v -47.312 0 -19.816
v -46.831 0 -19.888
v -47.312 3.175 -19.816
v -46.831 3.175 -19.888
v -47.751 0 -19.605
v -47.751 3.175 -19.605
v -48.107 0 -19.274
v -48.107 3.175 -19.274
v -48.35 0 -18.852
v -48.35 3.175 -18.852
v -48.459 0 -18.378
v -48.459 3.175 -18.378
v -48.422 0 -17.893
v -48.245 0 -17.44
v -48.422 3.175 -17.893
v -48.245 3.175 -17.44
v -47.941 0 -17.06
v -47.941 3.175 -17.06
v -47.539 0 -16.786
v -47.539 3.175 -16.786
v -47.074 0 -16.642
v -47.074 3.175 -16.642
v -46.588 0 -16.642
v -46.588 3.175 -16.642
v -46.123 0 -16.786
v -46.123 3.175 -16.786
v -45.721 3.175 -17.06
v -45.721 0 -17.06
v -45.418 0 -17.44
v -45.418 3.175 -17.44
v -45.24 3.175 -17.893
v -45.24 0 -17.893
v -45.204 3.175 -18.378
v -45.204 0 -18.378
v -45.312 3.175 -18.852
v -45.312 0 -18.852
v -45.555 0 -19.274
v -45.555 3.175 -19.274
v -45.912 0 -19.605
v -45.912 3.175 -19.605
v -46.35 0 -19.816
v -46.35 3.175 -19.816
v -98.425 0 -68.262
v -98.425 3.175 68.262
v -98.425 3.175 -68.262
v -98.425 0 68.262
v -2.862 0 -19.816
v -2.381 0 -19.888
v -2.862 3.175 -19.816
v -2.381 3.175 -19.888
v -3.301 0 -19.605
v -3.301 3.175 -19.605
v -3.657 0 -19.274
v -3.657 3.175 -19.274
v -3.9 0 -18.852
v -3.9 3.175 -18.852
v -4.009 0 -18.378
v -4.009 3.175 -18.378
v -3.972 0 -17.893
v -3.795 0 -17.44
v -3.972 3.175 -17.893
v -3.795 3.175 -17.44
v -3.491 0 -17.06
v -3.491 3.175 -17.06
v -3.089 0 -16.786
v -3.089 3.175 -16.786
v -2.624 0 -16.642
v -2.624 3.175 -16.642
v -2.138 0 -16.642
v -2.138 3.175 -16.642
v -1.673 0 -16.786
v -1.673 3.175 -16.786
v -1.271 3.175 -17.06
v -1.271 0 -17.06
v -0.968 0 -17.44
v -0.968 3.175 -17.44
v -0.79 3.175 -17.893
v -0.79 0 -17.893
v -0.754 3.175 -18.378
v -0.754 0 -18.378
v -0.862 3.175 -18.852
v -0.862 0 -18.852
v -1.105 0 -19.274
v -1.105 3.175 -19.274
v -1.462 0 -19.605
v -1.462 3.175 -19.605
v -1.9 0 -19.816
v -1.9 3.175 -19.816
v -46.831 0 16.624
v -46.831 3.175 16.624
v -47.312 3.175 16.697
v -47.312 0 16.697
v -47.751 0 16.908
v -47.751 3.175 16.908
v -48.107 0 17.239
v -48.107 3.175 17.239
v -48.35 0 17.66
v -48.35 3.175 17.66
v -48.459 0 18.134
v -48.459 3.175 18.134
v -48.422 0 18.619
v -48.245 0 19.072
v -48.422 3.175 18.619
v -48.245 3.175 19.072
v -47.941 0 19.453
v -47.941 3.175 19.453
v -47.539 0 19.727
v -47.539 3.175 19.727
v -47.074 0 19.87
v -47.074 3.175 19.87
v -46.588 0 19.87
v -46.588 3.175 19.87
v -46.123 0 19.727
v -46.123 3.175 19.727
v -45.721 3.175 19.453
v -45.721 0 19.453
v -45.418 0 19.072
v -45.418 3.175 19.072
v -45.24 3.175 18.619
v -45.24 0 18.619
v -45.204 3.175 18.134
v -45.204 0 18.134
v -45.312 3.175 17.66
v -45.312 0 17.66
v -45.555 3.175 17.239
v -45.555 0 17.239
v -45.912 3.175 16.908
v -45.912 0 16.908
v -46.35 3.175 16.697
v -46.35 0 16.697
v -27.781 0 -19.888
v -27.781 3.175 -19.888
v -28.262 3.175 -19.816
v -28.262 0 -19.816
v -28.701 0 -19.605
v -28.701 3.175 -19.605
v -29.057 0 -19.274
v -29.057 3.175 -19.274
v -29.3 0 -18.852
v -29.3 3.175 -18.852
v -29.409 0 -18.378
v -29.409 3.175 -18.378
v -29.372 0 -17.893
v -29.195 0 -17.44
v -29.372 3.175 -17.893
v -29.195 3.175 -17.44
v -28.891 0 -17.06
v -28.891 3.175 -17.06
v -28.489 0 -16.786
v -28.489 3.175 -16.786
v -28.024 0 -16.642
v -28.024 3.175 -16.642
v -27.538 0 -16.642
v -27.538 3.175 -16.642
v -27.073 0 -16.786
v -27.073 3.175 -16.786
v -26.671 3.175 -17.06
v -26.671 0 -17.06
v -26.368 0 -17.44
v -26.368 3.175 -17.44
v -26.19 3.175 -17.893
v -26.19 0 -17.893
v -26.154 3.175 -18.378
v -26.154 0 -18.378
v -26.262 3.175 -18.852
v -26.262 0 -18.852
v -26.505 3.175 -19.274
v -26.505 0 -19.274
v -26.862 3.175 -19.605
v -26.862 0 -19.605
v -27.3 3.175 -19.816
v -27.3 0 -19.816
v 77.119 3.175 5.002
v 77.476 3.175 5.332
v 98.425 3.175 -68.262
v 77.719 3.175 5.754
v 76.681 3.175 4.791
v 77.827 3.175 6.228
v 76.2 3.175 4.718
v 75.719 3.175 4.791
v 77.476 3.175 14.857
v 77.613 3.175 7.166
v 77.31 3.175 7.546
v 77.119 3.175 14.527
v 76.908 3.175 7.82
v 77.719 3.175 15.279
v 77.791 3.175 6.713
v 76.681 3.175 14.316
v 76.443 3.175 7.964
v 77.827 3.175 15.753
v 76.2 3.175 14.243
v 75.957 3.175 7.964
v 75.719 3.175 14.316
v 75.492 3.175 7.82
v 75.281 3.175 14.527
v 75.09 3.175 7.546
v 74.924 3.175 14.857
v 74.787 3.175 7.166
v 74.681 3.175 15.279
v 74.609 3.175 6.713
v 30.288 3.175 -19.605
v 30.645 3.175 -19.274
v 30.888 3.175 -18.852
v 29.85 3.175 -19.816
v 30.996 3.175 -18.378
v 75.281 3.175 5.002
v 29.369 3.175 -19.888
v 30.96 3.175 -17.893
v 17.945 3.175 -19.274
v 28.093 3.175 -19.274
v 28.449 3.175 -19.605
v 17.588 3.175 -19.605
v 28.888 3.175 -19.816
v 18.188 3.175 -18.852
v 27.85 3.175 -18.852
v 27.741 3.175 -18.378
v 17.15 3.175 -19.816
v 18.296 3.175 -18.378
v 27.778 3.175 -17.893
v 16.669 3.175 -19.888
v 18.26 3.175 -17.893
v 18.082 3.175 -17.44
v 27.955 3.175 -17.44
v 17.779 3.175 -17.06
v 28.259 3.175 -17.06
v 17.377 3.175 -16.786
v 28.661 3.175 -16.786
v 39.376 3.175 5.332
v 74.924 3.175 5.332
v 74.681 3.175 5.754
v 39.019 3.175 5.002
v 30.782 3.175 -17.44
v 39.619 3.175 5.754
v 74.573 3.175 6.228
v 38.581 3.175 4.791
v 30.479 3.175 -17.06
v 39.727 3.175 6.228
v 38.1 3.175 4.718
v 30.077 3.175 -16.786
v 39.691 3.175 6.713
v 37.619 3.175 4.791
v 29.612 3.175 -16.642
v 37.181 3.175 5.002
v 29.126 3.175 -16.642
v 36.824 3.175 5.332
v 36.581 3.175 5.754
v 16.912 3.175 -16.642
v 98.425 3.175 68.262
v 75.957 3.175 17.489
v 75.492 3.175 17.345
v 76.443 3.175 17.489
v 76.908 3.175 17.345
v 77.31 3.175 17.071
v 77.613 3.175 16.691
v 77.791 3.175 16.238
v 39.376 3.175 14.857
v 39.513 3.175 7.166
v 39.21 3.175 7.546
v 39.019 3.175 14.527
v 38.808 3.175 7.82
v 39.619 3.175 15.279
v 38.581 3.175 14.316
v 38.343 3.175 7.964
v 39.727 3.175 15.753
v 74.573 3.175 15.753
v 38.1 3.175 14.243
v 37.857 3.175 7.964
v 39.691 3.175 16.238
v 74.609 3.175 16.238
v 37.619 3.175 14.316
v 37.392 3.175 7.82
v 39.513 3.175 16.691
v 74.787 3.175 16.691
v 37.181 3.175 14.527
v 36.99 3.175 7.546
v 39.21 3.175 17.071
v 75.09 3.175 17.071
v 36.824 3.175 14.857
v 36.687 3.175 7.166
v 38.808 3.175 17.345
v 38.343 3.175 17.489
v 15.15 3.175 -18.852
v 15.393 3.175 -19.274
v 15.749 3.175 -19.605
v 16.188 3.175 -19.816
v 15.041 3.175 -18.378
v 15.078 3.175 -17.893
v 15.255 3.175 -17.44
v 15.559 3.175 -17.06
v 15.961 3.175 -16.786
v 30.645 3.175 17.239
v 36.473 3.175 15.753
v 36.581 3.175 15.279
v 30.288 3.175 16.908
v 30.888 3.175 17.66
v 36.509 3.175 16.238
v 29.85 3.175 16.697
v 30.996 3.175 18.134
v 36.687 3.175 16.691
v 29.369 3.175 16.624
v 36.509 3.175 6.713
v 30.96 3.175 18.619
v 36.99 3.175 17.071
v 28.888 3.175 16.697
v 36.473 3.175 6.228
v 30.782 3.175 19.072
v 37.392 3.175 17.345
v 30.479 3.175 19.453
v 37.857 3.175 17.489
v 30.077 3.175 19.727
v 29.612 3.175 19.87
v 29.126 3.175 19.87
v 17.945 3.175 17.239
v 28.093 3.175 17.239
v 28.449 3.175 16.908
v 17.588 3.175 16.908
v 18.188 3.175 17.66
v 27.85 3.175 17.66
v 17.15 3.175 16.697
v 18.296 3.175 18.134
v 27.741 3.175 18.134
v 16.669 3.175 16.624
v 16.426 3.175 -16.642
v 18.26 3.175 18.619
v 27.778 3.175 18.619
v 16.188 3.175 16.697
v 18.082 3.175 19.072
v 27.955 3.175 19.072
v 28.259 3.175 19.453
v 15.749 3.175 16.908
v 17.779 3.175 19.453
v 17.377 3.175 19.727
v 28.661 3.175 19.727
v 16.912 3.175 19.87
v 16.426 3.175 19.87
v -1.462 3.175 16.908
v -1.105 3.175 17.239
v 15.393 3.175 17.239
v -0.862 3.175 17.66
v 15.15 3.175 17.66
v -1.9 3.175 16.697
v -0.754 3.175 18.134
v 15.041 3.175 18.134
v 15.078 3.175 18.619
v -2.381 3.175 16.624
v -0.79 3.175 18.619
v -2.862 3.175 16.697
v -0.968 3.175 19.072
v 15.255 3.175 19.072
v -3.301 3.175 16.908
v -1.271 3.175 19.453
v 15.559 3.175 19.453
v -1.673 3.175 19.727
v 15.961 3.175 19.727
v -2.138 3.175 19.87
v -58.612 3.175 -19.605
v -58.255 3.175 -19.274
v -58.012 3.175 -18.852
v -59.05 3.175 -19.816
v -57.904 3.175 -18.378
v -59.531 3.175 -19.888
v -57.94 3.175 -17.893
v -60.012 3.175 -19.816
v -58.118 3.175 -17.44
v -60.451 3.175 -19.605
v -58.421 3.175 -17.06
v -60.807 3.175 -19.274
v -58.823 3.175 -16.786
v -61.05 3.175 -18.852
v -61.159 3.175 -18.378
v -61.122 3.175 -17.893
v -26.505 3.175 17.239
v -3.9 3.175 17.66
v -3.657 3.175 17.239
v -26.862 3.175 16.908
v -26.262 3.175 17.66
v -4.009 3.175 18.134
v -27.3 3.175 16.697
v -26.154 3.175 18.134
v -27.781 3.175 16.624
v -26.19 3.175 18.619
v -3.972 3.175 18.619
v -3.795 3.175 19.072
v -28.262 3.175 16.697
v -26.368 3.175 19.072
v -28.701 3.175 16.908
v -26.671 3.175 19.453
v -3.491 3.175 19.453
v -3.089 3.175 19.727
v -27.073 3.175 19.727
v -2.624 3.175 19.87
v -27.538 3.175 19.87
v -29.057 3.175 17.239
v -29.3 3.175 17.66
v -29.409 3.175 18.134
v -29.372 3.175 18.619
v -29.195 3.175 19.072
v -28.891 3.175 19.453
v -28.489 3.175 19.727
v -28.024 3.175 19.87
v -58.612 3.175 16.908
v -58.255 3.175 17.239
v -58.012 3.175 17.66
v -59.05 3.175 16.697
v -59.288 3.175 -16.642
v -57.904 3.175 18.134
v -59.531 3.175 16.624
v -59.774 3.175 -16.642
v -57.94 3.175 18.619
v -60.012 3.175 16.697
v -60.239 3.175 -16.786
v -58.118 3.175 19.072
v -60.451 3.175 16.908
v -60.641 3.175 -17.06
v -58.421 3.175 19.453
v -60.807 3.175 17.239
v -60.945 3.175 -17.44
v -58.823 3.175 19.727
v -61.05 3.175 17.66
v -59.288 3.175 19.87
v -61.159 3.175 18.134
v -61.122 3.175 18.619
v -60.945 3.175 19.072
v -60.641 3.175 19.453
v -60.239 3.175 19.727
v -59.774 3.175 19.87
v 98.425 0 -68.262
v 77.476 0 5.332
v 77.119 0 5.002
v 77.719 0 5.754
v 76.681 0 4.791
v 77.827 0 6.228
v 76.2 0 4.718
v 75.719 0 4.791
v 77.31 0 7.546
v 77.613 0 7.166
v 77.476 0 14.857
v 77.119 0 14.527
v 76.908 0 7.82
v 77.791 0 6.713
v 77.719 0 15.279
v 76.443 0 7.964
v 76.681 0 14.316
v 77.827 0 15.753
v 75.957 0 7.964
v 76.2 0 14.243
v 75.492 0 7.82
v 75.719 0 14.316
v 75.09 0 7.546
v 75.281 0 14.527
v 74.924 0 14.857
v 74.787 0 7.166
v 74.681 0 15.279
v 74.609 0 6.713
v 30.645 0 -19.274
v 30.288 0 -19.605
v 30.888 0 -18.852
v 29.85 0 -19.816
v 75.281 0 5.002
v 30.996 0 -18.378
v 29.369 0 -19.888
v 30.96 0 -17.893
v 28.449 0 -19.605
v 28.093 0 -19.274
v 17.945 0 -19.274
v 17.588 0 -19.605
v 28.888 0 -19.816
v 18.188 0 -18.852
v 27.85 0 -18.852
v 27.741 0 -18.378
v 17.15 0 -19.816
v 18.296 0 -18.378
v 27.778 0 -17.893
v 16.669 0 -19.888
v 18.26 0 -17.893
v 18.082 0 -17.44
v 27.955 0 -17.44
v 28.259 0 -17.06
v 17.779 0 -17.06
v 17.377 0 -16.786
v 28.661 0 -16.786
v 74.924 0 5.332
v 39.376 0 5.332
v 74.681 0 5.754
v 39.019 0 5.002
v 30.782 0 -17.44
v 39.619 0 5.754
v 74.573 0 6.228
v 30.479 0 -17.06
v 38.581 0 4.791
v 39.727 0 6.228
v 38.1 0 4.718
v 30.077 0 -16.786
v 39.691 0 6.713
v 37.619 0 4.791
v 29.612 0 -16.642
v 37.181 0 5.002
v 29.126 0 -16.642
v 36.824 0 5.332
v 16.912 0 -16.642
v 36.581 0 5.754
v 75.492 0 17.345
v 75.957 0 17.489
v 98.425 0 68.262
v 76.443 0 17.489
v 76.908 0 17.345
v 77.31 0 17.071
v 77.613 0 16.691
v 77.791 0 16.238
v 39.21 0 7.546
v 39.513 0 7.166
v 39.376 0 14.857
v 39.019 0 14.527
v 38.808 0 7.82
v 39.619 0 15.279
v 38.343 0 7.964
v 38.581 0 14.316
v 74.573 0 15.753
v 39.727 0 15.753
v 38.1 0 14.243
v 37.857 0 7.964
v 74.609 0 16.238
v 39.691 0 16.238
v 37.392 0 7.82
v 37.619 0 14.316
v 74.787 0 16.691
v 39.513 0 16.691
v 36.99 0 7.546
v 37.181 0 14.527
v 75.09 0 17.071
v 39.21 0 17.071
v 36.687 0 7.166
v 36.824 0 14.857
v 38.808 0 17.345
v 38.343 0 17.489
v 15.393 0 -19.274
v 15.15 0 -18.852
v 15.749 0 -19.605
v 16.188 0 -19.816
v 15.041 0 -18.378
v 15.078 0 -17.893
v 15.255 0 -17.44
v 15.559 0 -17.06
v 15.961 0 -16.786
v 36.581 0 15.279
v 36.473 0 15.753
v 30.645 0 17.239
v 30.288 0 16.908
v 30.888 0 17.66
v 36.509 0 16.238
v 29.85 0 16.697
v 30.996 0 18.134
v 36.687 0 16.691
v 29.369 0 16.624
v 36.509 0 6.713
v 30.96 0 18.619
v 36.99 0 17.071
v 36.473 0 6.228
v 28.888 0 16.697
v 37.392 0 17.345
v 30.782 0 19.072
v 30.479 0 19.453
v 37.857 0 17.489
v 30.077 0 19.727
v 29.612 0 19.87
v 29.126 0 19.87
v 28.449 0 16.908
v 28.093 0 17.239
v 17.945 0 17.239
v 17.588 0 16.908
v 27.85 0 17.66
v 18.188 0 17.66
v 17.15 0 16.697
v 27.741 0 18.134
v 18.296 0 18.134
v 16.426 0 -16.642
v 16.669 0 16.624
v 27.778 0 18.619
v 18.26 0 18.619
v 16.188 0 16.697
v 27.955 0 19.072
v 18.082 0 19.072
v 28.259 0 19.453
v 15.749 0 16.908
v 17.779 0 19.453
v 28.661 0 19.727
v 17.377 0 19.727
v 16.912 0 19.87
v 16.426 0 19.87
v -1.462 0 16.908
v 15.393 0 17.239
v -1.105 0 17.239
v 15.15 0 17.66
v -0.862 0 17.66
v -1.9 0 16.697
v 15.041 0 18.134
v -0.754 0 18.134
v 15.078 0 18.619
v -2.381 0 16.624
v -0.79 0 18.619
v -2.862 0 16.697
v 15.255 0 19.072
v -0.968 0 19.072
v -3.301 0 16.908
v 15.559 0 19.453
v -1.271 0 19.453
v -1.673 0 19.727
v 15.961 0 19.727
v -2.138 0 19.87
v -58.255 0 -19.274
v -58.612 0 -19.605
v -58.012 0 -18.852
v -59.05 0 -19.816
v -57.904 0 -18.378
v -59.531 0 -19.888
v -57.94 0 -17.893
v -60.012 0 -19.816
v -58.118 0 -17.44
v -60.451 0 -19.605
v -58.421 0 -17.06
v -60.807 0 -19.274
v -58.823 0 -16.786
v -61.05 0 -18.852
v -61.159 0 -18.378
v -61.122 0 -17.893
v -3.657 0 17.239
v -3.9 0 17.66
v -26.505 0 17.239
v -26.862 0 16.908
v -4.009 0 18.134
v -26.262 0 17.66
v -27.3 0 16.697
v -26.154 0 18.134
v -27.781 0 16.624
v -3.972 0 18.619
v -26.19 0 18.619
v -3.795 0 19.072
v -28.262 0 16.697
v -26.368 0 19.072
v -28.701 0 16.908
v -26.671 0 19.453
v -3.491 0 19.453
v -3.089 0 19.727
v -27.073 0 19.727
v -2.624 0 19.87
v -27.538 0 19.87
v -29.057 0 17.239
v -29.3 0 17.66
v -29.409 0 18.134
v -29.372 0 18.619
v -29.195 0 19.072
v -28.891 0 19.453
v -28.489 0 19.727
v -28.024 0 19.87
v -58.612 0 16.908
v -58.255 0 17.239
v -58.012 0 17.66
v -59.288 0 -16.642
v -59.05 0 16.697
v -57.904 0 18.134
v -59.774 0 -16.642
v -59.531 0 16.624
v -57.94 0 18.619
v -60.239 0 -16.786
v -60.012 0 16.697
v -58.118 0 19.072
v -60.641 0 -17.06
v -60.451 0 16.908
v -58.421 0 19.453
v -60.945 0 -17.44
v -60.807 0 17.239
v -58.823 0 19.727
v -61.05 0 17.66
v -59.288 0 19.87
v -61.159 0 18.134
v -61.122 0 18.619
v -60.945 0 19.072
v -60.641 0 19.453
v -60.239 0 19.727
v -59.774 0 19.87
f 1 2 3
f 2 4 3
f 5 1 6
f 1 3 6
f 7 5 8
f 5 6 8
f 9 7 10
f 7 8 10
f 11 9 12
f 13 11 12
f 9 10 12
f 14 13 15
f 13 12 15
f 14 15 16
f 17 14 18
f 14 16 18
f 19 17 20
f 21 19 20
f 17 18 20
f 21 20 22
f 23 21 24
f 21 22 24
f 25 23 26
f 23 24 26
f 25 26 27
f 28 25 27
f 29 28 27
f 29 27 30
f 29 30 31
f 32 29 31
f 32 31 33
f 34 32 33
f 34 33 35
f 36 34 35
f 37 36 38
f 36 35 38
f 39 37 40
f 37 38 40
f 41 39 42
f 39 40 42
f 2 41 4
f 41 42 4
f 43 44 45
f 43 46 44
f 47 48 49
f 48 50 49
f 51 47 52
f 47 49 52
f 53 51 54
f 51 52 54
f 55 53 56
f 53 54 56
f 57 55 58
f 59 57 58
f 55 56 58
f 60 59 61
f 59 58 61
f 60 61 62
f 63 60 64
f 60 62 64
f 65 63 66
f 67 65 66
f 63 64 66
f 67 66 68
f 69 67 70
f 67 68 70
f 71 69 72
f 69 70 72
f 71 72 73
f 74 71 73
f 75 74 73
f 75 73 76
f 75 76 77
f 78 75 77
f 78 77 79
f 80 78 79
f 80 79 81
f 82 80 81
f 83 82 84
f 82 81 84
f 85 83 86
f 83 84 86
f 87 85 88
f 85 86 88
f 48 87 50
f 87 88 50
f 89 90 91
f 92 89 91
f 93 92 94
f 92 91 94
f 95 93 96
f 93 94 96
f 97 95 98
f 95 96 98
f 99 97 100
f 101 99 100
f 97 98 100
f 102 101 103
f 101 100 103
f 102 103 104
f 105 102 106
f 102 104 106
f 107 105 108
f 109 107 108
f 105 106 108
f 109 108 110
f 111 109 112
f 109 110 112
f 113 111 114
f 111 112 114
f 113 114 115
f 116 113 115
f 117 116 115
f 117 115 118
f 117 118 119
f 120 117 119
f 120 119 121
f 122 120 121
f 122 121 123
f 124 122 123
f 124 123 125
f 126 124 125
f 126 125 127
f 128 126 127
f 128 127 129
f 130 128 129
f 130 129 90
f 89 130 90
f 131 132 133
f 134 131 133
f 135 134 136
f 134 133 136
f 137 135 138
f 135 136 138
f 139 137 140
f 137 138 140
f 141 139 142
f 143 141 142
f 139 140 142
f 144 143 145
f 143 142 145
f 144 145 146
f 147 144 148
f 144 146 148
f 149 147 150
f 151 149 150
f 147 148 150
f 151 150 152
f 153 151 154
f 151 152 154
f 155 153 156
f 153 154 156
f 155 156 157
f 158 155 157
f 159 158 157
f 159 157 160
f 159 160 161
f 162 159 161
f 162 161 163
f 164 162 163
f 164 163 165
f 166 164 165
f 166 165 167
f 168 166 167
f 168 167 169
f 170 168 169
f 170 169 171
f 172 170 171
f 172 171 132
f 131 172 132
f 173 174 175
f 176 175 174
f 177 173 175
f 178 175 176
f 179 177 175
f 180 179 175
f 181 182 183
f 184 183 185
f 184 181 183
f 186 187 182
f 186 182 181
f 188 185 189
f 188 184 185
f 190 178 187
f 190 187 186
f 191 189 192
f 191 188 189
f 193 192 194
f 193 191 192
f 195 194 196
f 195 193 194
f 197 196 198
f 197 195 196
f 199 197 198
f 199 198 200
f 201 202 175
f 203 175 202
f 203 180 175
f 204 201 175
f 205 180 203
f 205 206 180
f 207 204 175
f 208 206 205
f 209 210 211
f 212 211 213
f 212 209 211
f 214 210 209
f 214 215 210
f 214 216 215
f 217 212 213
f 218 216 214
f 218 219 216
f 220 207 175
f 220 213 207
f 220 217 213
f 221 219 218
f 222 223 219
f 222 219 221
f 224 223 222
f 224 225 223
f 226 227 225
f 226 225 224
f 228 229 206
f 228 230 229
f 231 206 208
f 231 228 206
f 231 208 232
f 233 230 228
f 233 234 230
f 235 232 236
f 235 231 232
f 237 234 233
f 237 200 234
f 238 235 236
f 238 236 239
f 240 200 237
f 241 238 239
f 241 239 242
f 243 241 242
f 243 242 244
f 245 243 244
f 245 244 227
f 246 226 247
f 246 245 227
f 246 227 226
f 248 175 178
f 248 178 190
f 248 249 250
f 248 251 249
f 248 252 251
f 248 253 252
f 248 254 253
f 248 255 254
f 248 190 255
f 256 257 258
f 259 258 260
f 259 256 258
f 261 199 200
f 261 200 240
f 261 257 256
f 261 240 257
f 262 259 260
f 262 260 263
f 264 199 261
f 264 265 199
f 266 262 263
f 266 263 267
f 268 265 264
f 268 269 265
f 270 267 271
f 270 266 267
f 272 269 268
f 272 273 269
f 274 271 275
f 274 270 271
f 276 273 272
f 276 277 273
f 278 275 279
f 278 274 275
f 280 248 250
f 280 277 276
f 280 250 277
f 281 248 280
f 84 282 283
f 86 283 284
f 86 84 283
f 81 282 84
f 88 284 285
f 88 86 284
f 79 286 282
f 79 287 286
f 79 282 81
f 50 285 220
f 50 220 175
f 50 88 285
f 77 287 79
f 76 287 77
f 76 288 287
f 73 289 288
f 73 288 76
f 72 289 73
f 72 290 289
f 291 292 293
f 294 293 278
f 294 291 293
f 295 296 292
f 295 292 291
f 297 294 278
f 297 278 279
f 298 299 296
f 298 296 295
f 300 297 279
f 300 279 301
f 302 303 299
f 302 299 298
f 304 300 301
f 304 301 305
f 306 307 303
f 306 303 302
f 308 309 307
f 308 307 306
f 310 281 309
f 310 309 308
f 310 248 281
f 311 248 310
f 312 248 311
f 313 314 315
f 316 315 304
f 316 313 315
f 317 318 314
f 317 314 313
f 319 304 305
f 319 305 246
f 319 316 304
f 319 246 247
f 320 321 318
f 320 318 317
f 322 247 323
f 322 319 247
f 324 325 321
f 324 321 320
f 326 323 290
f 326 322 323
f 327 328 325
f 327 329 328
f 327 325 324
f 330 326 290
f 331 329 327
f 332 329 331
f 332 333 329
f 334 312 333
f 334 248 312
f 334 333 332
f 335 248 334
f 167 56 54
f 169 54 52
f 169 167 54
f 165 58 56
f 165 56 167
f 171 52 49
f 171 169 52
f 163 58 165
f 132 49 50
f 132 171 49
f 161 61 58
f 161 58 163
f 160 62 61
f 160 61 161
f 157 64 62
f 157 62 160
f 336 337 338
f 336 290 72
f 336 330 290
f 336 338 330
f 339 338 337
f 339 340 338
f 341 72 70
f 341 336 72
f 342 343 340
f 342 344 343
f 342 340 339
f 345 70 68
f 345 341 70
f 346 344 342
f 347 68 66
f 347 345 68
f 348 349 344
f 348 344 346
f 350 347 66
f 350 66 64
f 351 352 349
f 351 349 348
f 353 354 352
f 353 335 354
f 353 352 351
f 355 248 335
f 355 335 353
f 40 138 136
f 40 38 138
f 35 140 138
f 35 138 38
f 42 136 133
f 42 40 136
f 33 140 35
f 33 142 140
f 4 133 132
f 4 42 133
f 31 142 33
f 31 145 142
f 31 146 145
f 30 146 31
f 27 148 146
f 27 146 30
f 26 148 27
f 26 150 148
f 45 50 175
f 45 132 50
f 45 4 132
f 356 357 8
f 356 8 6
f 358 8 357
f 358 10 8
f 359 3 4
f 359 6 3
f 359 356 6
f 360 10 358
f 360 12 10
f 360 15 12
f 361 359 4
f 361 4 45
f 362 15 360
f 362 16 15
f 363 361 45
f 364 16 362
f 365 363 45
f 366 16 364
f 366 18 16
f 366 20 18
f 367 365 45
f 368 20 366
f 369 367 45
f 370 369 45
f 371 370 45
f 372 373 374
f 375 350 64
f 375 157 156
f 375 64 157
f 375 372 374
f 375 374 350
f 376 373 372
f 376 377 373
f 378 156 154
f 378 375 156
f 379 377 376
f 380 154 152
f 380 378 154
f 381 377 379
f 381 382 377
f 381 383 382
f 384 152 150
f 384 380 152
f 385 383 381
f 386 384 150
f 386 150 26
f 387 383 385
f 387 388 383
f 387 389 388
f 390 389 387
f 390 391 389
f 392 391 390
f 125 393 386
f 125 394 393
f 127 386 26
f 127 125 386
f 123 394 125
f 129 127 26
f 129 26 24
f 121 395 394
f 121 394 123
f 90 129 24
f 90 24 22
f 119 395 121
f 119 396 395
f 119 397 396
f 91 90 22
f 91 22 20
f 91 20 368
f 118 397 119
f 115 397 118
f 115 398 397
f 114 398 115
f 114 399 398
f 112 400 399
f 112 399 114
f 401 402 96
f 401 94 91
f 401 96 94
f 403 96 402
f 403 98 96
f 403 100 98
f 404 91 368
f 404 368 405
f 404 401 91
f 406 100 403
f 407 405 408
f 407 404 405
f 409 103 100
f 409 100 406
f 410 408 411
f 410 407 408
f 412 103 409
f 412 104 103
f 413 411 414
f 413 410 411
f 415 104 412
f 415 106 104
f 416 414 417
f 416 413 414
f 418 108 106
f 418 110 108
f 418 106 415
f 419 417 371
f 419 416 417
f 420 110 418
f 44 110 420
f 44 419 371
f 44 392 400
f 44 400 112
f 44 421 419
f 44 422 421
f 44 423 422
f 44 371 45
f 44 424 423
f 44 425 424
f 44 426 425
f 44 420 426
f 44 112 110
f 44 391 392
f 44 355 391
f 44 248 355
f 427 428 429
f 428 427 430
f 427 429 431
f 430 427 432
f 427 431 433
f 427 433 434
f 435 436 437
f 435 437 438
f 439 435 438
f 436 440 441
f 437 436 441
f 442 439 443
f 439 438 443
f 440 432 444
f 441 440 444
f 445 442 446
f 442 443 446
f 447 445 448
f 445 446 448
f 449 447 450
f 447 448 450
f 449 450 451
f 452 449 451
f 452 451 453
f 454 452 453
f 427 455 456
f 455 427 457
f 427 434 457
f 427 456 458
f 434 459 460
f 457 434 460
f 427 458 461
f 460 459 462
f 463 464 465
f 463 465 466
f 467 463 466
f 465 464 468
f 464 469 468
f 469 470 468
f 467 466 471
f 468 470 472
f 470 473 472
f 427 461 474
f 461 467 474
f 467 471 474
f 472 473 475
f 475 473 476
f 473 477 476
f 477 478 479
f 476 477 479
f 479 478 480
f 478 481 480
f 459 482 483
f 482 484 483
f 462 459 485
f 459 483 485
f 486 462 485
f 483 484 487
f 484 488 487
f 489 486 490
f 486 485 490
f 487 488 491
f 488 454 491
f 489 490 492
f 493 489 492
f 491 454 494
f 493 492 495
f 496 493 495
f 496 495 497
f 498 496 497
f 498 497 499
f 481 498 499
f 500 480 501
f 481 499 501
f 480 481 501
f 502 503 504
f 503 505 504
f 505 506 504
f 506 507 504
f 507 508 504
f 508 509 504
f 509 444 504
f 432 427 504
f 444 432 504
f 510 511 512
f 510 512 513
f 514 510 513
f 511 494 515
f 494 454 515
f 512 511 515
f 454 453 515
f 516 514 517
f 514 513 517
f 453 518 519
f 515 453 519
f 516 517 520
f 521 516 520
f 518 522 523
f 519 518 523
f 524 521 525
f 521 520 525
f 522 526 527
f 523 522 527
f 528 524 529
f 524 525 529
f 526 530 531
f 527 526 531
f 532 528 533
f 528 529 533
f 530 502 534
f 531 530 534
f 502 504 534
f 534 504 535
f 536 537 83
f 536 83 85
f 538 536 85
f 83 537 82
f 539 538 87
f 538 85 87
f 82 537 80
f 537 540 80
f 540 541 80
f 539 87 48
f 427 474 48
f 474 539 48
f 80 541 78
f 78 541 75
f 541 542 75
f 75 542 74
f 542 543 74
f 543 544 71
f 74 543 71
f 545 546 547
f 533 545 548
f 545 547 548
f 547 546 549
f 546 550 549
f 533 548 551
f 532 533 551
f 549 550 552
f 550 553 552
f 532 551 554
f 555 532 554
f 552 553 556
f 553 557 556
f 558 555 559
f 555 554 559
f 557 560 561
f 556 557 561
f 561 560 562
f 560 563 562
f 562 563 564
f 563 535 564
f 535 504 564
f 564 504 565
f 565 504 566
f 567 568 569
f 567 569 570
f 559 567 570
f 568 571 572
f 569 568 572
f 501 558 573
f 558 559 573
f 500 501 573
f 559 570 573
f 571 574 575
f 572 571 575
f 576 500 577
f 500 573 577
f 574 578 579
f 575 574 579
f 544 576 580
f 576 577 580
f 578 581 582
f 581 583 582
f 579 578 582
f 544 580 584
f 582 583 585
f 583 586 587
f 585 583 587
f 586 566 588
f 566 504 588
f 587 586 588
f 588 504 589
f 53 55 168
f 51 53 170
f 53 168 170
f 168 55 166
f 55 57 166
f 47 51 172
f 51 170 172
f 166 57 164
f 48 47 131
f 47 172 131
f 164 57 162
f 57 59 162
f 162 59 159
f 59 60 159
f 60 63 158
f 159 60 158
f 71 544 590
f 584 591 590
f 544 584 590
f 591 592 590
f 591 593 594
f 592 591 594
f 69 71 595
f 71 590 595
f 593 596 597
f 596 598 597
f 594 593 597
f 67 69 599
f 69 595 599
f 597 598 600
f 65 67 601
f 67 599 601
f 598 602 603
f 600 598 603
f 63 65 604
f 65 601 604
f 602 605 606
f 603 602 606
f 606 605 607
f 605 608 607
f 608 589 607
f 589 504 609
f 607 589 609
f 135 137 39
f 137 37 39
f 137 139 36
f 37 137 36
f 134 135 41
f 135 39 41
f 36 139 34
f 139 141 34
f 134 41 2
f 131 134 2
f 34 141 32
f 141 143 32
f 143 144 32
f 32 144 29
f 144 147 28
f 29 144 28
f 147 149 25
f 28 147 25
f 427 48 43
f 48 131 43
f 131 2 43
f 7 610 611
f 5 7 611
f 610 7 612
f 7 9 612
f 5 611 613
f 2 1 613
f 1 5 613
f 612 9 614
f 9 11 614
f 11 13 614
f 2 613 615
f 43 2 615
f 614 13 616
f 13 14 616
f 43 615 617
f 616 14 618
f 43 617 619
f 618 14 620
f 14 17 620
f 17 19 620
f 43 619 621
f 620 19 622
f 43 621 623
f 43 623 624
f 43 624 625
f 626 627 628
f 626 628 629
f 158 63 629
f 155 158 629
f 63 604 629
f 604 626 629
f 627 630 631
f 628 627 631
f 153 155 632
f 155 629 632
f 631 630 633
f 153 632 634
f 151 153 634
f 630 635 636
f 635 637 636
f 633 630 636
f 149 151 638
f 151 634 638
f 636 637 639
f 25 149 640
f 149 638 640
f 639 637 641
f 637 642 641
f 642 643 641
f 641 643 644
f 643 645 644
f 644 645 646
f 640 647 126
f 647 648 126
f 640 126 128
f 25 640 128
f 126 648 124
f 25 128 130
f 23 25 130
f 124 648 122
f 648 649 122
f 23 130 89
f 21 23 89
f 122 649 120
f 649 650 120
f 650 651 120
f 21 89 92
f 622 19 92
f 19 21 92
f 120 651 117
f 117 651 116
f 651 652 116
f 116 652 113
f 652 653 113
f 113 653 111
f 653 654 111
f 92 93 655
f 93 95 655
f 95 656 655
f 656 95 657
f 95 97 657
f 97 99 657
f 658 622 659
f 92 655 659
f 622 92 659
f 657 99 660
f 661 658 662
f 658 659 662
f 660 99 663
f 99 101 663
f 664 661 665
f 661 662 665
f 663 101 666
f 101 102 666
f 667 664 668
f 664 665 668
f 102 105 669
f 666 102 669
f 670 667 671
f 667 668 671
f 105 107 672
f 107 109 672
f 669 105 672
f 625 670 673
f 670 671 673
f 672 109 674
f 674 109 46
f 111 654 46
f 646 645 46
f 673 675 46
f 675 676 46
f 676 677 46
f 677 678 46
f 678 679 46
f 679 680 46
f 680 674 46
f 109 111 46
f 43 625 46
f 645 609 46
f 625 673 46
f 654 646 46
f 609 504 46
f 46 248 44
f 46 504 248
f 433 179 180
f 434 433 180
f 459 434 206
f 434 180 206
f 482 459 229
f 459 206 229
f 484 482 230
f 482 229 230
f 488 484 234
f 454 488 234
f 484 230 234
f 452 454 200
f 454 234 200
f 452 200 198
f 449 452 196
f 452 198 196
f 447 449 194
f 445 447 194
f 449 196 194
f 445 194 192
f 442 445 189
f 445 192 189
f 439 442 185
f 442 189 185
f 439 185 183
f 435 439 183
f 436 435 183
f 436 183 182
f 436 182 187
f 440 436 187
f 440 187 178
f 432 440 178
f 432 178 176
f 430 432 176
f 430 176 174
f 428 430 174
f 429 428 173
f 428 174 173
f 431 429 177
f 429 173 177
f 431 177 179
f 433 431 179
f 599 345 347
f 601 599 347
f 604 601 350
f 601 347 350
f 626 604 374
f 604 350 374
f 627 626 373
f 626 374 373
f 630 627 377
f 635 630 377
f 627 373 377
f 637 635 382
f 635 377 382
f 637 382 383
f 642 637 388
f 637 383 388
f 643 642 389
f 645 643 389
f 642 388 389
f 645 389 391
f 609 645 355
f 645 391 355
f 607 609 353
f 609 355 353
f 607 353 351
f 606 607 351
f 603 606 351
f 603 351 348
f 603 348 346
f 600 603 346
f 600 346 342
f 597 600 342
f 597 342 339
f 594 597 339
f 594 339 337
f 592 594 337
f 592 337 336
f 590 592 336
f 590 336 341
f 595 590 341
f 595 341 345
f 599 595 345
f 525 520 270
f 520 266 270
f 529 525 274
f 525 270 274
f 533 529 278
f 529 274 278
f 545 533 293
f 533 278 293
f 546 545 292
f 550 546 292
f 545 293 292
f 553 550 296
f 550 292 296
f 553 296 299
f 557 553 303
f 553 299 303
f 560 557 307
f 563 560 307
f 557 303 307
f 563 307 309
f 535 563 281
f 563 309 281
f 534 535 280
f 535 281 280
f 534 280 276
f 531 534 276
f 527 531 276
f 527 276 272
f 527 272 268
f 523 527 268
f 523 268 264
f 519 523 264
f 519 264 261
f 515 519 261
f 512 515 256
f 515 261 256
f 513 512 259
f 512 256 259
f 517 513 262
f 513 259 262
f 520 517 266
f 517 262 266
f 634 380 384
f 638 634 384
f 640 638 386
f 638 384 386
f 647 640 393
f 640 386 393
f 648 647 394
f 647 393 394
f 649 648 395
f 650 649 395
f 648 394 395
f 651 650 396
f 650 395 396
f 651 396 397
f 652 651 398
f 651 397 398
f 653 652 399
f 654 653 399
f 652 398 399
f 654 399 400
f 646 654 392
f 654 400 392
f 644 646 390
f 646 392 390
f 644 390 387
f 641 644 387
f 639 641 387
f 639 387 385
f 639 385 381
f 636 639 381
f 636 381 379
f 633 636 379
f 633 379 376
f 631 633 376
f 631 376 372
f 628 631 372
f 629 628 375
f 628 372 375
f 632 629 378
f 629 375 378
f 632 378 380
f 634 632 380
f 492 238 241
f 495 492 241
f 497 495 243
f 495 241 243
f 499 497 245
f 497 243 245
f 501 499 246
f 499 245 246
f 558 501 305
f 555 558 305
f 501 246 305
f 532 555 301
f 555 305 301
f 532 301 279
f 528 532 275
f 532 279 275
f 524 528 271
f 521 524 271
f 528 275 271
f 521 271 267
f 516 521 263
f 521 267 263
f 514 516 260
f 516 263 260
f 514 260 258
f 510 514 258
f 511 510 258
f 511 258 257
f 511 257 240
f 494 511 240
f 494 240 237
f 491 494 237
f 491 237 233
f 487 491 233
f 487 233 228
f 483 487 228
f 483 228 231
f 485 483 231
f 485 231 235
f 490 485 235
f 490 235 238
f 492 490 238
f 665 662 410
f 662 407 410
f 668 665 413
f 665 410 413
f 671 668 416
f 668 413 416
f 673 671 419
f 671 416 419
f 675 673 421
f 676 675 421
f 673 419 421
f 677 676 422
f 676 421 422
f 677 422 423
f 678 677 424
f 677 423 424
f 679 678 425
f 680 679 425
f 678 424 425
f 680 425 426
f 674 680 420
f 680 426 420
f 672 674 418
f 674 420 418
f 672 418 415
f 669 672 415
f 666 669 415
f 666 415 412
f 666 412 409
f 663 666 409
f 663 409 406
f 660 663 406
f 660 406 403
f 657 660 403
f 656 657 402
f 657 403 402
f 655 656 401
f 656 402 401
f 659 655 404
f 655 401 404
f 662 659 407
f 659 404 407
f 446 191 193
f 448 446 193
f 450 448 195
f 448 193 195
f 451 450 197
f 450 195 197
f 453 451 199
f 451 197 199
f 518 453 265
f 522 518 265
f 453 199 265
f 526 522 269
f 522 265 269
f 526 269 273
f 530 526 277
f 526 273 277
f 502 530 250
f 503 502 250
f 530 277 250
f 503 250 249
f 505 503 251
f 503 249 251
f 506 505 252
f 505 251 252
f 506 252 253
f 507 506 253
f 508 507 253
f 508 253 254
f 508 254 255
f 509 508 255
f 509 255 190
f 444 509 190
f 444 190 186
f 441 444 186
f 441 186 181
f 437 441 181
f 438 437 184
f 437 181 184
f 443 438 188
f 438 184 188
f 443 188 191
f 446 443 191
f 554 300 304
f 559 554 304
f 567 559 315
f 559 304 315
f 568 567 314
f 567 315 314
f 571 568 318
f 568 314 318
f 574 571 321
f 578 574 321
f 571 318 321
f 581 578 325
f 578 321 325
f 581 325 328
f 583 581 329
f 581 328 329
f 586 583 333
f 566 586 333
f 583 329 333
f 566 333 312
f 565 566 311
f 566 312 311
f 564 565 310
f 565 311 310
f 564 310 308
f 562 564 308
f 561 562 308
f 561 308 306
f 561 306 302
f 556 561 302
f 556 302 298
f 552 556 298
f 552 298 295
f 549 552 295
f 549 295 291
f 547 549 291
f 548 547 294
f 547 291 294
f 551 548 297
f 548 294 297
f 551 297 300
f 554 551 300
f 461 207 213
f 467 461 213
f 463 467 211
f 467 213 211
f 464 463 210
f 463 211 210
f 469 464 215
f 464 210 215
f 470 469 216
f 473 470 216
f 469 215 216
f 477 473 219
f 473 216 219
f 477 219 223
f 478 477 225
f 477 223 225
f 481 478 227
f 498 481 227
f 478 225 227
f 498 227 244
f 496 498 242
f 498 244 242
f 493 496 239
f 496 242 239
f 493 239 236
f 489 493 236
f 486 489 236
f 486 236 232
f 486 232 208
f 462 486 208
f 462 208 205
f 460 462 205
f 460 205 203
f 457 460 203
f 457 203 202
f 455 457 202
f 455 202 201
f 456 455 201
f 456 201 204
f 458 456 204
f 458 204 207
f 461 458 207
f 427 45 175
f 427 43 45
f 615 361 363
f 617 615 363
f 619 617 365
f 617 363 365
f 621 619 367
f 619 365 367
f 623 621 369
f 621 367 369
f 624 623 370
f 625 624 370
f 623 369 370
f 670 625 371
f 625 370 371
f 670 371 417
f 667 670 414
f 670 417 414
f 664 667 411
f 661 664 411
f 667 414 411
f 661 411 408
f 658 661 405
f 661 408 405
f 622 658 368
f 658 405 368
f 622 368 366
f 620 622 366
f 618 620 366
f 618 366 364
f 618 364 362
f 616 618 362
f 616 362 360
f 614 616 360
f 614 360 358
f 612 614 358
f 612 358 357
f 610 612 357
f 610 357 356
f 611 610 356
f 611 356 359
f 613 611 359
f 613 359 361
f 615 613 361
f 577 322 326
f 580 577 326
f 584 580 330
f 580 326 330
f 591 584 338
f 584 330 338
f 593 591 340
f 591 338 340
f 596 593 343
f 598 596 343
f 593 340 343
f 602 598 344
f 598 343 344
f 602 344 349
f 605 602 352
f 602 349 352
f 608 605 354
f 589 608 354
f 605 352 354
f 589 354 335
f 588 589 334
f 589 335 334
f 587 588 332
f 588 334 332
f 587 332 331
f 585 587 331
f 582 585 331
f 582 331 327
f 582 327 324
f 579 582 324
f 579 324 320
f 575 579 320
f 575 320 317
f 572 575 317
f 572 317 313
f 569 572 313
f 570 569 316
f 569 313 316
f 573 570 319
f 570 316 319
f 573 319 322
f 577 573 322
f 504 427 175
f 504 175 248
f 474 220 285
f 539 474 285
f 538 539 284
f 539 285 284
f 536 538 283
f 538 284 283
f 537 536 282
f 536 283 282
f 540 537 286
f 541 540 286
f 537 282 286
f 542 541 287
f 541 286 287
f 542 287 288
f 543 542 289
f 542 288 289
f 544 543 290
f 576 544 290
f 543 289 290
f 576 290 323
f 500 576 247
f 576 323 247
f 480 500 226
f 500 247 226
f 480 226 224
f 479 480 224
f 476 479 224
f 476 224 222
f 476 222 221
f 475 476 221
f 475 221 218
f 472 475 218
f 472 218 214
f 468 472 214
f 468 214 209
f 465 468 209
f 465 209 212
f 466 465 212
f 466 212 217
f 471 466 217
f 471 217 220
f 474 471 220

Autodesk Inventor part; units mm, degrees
ref_plane "YZ Plane" through (0, 0, 0) normal (1, 0, 0) x (0, 1, 0)
ref_plane "XZ Plane" through (0, 0, 0) normal (0, 1, 0) x (-1, 0, 0)
ref_plane "XY Plane" through (0, 0, 0) normal (0, 0, 1) x (1, 0, 0)
sketch "Sketch1" plane through (0, 0, 0) normal (0, 1, 0) x (-1, 0, 0)
  line L0 (98.425, -68.2625) -> (-98.425, -68.2625)
  line L1 (-98.425, -68.2625) -> (-98.425, 68.2625)
  line L2 (-98.425, 68.2625) -> (98.425, 68.2625)
  line L3 (98.425, 68.2625) -> (98.425, -68.2625)
  line L4 (98.425, -68.2625) -> (-98.425, 68.2625) construction
  line L5 (-98.425, -68.2625) -> (98.425, 68.2625) construction
  point P0 (0, 0)
  point P1 (45.2437, 60.325)
  dimension "d11" = 136.525
  dimension "d13" = 196.85
extrude "Extrusion1" add sketch "Sketch1" along normal blind 3.175
sketch "Sketch2" plane through (0, 0, 0) normal (0, -1, 0) x (1, 0, 0)
  point P0 (76.2, 15.875)
  point P1 (29.3688, -18.2562)
  point P2 (16.6688, -18.2562)
  point P3 (29.3688, 18.2562)
  point P4 (16.6688, 18.2562)
  point P5 (-59.5312, 18.2562)
  point P6 (-46.8312, 18.2562)
  point P7 (-46.8312, -18.2562)
  point P8 (-59.5312, -18.2562)
  point P9 (-27.7812, 18.2562)
  point P10 (-2.3812, 18.2562)
  point P11 (-2.3812, -18.2562)
  point P12 (-27.7812, -18.2562)
  point P13 (76.2, 6.35)
  point P14 (38.1, 15.875)
  point P15 (38.1, 6.35)
hole "Hole1" at (76.2, 0, 15.875) at (29.3688, 0, -18.2562) at (16.6688, 0, -18.2562) at (29.3688, 0, 18.2562) at (16.6688, 0, 18.2562) at (-59.5312, 0, 18.2562) at (-46.8312, 0, 18.2562) at (-46.8312, 0, -18.2562) at (-59.5312, 0, -18.2562) at (-27.7812, 0, 18.2562) at (-2.3812, 0, 18.2562) at (-2.3812, 0, -18.2562) at (-27.7812, 0, -18.2562) at (76.2, 0, 6.35) at (38.1, 0, 15.875) at (38.1, 0, 6.35) direction (0, 1, 0) diameter 3.2639 end through all
properties part number "Mount PLate" material "UHMW, White"
